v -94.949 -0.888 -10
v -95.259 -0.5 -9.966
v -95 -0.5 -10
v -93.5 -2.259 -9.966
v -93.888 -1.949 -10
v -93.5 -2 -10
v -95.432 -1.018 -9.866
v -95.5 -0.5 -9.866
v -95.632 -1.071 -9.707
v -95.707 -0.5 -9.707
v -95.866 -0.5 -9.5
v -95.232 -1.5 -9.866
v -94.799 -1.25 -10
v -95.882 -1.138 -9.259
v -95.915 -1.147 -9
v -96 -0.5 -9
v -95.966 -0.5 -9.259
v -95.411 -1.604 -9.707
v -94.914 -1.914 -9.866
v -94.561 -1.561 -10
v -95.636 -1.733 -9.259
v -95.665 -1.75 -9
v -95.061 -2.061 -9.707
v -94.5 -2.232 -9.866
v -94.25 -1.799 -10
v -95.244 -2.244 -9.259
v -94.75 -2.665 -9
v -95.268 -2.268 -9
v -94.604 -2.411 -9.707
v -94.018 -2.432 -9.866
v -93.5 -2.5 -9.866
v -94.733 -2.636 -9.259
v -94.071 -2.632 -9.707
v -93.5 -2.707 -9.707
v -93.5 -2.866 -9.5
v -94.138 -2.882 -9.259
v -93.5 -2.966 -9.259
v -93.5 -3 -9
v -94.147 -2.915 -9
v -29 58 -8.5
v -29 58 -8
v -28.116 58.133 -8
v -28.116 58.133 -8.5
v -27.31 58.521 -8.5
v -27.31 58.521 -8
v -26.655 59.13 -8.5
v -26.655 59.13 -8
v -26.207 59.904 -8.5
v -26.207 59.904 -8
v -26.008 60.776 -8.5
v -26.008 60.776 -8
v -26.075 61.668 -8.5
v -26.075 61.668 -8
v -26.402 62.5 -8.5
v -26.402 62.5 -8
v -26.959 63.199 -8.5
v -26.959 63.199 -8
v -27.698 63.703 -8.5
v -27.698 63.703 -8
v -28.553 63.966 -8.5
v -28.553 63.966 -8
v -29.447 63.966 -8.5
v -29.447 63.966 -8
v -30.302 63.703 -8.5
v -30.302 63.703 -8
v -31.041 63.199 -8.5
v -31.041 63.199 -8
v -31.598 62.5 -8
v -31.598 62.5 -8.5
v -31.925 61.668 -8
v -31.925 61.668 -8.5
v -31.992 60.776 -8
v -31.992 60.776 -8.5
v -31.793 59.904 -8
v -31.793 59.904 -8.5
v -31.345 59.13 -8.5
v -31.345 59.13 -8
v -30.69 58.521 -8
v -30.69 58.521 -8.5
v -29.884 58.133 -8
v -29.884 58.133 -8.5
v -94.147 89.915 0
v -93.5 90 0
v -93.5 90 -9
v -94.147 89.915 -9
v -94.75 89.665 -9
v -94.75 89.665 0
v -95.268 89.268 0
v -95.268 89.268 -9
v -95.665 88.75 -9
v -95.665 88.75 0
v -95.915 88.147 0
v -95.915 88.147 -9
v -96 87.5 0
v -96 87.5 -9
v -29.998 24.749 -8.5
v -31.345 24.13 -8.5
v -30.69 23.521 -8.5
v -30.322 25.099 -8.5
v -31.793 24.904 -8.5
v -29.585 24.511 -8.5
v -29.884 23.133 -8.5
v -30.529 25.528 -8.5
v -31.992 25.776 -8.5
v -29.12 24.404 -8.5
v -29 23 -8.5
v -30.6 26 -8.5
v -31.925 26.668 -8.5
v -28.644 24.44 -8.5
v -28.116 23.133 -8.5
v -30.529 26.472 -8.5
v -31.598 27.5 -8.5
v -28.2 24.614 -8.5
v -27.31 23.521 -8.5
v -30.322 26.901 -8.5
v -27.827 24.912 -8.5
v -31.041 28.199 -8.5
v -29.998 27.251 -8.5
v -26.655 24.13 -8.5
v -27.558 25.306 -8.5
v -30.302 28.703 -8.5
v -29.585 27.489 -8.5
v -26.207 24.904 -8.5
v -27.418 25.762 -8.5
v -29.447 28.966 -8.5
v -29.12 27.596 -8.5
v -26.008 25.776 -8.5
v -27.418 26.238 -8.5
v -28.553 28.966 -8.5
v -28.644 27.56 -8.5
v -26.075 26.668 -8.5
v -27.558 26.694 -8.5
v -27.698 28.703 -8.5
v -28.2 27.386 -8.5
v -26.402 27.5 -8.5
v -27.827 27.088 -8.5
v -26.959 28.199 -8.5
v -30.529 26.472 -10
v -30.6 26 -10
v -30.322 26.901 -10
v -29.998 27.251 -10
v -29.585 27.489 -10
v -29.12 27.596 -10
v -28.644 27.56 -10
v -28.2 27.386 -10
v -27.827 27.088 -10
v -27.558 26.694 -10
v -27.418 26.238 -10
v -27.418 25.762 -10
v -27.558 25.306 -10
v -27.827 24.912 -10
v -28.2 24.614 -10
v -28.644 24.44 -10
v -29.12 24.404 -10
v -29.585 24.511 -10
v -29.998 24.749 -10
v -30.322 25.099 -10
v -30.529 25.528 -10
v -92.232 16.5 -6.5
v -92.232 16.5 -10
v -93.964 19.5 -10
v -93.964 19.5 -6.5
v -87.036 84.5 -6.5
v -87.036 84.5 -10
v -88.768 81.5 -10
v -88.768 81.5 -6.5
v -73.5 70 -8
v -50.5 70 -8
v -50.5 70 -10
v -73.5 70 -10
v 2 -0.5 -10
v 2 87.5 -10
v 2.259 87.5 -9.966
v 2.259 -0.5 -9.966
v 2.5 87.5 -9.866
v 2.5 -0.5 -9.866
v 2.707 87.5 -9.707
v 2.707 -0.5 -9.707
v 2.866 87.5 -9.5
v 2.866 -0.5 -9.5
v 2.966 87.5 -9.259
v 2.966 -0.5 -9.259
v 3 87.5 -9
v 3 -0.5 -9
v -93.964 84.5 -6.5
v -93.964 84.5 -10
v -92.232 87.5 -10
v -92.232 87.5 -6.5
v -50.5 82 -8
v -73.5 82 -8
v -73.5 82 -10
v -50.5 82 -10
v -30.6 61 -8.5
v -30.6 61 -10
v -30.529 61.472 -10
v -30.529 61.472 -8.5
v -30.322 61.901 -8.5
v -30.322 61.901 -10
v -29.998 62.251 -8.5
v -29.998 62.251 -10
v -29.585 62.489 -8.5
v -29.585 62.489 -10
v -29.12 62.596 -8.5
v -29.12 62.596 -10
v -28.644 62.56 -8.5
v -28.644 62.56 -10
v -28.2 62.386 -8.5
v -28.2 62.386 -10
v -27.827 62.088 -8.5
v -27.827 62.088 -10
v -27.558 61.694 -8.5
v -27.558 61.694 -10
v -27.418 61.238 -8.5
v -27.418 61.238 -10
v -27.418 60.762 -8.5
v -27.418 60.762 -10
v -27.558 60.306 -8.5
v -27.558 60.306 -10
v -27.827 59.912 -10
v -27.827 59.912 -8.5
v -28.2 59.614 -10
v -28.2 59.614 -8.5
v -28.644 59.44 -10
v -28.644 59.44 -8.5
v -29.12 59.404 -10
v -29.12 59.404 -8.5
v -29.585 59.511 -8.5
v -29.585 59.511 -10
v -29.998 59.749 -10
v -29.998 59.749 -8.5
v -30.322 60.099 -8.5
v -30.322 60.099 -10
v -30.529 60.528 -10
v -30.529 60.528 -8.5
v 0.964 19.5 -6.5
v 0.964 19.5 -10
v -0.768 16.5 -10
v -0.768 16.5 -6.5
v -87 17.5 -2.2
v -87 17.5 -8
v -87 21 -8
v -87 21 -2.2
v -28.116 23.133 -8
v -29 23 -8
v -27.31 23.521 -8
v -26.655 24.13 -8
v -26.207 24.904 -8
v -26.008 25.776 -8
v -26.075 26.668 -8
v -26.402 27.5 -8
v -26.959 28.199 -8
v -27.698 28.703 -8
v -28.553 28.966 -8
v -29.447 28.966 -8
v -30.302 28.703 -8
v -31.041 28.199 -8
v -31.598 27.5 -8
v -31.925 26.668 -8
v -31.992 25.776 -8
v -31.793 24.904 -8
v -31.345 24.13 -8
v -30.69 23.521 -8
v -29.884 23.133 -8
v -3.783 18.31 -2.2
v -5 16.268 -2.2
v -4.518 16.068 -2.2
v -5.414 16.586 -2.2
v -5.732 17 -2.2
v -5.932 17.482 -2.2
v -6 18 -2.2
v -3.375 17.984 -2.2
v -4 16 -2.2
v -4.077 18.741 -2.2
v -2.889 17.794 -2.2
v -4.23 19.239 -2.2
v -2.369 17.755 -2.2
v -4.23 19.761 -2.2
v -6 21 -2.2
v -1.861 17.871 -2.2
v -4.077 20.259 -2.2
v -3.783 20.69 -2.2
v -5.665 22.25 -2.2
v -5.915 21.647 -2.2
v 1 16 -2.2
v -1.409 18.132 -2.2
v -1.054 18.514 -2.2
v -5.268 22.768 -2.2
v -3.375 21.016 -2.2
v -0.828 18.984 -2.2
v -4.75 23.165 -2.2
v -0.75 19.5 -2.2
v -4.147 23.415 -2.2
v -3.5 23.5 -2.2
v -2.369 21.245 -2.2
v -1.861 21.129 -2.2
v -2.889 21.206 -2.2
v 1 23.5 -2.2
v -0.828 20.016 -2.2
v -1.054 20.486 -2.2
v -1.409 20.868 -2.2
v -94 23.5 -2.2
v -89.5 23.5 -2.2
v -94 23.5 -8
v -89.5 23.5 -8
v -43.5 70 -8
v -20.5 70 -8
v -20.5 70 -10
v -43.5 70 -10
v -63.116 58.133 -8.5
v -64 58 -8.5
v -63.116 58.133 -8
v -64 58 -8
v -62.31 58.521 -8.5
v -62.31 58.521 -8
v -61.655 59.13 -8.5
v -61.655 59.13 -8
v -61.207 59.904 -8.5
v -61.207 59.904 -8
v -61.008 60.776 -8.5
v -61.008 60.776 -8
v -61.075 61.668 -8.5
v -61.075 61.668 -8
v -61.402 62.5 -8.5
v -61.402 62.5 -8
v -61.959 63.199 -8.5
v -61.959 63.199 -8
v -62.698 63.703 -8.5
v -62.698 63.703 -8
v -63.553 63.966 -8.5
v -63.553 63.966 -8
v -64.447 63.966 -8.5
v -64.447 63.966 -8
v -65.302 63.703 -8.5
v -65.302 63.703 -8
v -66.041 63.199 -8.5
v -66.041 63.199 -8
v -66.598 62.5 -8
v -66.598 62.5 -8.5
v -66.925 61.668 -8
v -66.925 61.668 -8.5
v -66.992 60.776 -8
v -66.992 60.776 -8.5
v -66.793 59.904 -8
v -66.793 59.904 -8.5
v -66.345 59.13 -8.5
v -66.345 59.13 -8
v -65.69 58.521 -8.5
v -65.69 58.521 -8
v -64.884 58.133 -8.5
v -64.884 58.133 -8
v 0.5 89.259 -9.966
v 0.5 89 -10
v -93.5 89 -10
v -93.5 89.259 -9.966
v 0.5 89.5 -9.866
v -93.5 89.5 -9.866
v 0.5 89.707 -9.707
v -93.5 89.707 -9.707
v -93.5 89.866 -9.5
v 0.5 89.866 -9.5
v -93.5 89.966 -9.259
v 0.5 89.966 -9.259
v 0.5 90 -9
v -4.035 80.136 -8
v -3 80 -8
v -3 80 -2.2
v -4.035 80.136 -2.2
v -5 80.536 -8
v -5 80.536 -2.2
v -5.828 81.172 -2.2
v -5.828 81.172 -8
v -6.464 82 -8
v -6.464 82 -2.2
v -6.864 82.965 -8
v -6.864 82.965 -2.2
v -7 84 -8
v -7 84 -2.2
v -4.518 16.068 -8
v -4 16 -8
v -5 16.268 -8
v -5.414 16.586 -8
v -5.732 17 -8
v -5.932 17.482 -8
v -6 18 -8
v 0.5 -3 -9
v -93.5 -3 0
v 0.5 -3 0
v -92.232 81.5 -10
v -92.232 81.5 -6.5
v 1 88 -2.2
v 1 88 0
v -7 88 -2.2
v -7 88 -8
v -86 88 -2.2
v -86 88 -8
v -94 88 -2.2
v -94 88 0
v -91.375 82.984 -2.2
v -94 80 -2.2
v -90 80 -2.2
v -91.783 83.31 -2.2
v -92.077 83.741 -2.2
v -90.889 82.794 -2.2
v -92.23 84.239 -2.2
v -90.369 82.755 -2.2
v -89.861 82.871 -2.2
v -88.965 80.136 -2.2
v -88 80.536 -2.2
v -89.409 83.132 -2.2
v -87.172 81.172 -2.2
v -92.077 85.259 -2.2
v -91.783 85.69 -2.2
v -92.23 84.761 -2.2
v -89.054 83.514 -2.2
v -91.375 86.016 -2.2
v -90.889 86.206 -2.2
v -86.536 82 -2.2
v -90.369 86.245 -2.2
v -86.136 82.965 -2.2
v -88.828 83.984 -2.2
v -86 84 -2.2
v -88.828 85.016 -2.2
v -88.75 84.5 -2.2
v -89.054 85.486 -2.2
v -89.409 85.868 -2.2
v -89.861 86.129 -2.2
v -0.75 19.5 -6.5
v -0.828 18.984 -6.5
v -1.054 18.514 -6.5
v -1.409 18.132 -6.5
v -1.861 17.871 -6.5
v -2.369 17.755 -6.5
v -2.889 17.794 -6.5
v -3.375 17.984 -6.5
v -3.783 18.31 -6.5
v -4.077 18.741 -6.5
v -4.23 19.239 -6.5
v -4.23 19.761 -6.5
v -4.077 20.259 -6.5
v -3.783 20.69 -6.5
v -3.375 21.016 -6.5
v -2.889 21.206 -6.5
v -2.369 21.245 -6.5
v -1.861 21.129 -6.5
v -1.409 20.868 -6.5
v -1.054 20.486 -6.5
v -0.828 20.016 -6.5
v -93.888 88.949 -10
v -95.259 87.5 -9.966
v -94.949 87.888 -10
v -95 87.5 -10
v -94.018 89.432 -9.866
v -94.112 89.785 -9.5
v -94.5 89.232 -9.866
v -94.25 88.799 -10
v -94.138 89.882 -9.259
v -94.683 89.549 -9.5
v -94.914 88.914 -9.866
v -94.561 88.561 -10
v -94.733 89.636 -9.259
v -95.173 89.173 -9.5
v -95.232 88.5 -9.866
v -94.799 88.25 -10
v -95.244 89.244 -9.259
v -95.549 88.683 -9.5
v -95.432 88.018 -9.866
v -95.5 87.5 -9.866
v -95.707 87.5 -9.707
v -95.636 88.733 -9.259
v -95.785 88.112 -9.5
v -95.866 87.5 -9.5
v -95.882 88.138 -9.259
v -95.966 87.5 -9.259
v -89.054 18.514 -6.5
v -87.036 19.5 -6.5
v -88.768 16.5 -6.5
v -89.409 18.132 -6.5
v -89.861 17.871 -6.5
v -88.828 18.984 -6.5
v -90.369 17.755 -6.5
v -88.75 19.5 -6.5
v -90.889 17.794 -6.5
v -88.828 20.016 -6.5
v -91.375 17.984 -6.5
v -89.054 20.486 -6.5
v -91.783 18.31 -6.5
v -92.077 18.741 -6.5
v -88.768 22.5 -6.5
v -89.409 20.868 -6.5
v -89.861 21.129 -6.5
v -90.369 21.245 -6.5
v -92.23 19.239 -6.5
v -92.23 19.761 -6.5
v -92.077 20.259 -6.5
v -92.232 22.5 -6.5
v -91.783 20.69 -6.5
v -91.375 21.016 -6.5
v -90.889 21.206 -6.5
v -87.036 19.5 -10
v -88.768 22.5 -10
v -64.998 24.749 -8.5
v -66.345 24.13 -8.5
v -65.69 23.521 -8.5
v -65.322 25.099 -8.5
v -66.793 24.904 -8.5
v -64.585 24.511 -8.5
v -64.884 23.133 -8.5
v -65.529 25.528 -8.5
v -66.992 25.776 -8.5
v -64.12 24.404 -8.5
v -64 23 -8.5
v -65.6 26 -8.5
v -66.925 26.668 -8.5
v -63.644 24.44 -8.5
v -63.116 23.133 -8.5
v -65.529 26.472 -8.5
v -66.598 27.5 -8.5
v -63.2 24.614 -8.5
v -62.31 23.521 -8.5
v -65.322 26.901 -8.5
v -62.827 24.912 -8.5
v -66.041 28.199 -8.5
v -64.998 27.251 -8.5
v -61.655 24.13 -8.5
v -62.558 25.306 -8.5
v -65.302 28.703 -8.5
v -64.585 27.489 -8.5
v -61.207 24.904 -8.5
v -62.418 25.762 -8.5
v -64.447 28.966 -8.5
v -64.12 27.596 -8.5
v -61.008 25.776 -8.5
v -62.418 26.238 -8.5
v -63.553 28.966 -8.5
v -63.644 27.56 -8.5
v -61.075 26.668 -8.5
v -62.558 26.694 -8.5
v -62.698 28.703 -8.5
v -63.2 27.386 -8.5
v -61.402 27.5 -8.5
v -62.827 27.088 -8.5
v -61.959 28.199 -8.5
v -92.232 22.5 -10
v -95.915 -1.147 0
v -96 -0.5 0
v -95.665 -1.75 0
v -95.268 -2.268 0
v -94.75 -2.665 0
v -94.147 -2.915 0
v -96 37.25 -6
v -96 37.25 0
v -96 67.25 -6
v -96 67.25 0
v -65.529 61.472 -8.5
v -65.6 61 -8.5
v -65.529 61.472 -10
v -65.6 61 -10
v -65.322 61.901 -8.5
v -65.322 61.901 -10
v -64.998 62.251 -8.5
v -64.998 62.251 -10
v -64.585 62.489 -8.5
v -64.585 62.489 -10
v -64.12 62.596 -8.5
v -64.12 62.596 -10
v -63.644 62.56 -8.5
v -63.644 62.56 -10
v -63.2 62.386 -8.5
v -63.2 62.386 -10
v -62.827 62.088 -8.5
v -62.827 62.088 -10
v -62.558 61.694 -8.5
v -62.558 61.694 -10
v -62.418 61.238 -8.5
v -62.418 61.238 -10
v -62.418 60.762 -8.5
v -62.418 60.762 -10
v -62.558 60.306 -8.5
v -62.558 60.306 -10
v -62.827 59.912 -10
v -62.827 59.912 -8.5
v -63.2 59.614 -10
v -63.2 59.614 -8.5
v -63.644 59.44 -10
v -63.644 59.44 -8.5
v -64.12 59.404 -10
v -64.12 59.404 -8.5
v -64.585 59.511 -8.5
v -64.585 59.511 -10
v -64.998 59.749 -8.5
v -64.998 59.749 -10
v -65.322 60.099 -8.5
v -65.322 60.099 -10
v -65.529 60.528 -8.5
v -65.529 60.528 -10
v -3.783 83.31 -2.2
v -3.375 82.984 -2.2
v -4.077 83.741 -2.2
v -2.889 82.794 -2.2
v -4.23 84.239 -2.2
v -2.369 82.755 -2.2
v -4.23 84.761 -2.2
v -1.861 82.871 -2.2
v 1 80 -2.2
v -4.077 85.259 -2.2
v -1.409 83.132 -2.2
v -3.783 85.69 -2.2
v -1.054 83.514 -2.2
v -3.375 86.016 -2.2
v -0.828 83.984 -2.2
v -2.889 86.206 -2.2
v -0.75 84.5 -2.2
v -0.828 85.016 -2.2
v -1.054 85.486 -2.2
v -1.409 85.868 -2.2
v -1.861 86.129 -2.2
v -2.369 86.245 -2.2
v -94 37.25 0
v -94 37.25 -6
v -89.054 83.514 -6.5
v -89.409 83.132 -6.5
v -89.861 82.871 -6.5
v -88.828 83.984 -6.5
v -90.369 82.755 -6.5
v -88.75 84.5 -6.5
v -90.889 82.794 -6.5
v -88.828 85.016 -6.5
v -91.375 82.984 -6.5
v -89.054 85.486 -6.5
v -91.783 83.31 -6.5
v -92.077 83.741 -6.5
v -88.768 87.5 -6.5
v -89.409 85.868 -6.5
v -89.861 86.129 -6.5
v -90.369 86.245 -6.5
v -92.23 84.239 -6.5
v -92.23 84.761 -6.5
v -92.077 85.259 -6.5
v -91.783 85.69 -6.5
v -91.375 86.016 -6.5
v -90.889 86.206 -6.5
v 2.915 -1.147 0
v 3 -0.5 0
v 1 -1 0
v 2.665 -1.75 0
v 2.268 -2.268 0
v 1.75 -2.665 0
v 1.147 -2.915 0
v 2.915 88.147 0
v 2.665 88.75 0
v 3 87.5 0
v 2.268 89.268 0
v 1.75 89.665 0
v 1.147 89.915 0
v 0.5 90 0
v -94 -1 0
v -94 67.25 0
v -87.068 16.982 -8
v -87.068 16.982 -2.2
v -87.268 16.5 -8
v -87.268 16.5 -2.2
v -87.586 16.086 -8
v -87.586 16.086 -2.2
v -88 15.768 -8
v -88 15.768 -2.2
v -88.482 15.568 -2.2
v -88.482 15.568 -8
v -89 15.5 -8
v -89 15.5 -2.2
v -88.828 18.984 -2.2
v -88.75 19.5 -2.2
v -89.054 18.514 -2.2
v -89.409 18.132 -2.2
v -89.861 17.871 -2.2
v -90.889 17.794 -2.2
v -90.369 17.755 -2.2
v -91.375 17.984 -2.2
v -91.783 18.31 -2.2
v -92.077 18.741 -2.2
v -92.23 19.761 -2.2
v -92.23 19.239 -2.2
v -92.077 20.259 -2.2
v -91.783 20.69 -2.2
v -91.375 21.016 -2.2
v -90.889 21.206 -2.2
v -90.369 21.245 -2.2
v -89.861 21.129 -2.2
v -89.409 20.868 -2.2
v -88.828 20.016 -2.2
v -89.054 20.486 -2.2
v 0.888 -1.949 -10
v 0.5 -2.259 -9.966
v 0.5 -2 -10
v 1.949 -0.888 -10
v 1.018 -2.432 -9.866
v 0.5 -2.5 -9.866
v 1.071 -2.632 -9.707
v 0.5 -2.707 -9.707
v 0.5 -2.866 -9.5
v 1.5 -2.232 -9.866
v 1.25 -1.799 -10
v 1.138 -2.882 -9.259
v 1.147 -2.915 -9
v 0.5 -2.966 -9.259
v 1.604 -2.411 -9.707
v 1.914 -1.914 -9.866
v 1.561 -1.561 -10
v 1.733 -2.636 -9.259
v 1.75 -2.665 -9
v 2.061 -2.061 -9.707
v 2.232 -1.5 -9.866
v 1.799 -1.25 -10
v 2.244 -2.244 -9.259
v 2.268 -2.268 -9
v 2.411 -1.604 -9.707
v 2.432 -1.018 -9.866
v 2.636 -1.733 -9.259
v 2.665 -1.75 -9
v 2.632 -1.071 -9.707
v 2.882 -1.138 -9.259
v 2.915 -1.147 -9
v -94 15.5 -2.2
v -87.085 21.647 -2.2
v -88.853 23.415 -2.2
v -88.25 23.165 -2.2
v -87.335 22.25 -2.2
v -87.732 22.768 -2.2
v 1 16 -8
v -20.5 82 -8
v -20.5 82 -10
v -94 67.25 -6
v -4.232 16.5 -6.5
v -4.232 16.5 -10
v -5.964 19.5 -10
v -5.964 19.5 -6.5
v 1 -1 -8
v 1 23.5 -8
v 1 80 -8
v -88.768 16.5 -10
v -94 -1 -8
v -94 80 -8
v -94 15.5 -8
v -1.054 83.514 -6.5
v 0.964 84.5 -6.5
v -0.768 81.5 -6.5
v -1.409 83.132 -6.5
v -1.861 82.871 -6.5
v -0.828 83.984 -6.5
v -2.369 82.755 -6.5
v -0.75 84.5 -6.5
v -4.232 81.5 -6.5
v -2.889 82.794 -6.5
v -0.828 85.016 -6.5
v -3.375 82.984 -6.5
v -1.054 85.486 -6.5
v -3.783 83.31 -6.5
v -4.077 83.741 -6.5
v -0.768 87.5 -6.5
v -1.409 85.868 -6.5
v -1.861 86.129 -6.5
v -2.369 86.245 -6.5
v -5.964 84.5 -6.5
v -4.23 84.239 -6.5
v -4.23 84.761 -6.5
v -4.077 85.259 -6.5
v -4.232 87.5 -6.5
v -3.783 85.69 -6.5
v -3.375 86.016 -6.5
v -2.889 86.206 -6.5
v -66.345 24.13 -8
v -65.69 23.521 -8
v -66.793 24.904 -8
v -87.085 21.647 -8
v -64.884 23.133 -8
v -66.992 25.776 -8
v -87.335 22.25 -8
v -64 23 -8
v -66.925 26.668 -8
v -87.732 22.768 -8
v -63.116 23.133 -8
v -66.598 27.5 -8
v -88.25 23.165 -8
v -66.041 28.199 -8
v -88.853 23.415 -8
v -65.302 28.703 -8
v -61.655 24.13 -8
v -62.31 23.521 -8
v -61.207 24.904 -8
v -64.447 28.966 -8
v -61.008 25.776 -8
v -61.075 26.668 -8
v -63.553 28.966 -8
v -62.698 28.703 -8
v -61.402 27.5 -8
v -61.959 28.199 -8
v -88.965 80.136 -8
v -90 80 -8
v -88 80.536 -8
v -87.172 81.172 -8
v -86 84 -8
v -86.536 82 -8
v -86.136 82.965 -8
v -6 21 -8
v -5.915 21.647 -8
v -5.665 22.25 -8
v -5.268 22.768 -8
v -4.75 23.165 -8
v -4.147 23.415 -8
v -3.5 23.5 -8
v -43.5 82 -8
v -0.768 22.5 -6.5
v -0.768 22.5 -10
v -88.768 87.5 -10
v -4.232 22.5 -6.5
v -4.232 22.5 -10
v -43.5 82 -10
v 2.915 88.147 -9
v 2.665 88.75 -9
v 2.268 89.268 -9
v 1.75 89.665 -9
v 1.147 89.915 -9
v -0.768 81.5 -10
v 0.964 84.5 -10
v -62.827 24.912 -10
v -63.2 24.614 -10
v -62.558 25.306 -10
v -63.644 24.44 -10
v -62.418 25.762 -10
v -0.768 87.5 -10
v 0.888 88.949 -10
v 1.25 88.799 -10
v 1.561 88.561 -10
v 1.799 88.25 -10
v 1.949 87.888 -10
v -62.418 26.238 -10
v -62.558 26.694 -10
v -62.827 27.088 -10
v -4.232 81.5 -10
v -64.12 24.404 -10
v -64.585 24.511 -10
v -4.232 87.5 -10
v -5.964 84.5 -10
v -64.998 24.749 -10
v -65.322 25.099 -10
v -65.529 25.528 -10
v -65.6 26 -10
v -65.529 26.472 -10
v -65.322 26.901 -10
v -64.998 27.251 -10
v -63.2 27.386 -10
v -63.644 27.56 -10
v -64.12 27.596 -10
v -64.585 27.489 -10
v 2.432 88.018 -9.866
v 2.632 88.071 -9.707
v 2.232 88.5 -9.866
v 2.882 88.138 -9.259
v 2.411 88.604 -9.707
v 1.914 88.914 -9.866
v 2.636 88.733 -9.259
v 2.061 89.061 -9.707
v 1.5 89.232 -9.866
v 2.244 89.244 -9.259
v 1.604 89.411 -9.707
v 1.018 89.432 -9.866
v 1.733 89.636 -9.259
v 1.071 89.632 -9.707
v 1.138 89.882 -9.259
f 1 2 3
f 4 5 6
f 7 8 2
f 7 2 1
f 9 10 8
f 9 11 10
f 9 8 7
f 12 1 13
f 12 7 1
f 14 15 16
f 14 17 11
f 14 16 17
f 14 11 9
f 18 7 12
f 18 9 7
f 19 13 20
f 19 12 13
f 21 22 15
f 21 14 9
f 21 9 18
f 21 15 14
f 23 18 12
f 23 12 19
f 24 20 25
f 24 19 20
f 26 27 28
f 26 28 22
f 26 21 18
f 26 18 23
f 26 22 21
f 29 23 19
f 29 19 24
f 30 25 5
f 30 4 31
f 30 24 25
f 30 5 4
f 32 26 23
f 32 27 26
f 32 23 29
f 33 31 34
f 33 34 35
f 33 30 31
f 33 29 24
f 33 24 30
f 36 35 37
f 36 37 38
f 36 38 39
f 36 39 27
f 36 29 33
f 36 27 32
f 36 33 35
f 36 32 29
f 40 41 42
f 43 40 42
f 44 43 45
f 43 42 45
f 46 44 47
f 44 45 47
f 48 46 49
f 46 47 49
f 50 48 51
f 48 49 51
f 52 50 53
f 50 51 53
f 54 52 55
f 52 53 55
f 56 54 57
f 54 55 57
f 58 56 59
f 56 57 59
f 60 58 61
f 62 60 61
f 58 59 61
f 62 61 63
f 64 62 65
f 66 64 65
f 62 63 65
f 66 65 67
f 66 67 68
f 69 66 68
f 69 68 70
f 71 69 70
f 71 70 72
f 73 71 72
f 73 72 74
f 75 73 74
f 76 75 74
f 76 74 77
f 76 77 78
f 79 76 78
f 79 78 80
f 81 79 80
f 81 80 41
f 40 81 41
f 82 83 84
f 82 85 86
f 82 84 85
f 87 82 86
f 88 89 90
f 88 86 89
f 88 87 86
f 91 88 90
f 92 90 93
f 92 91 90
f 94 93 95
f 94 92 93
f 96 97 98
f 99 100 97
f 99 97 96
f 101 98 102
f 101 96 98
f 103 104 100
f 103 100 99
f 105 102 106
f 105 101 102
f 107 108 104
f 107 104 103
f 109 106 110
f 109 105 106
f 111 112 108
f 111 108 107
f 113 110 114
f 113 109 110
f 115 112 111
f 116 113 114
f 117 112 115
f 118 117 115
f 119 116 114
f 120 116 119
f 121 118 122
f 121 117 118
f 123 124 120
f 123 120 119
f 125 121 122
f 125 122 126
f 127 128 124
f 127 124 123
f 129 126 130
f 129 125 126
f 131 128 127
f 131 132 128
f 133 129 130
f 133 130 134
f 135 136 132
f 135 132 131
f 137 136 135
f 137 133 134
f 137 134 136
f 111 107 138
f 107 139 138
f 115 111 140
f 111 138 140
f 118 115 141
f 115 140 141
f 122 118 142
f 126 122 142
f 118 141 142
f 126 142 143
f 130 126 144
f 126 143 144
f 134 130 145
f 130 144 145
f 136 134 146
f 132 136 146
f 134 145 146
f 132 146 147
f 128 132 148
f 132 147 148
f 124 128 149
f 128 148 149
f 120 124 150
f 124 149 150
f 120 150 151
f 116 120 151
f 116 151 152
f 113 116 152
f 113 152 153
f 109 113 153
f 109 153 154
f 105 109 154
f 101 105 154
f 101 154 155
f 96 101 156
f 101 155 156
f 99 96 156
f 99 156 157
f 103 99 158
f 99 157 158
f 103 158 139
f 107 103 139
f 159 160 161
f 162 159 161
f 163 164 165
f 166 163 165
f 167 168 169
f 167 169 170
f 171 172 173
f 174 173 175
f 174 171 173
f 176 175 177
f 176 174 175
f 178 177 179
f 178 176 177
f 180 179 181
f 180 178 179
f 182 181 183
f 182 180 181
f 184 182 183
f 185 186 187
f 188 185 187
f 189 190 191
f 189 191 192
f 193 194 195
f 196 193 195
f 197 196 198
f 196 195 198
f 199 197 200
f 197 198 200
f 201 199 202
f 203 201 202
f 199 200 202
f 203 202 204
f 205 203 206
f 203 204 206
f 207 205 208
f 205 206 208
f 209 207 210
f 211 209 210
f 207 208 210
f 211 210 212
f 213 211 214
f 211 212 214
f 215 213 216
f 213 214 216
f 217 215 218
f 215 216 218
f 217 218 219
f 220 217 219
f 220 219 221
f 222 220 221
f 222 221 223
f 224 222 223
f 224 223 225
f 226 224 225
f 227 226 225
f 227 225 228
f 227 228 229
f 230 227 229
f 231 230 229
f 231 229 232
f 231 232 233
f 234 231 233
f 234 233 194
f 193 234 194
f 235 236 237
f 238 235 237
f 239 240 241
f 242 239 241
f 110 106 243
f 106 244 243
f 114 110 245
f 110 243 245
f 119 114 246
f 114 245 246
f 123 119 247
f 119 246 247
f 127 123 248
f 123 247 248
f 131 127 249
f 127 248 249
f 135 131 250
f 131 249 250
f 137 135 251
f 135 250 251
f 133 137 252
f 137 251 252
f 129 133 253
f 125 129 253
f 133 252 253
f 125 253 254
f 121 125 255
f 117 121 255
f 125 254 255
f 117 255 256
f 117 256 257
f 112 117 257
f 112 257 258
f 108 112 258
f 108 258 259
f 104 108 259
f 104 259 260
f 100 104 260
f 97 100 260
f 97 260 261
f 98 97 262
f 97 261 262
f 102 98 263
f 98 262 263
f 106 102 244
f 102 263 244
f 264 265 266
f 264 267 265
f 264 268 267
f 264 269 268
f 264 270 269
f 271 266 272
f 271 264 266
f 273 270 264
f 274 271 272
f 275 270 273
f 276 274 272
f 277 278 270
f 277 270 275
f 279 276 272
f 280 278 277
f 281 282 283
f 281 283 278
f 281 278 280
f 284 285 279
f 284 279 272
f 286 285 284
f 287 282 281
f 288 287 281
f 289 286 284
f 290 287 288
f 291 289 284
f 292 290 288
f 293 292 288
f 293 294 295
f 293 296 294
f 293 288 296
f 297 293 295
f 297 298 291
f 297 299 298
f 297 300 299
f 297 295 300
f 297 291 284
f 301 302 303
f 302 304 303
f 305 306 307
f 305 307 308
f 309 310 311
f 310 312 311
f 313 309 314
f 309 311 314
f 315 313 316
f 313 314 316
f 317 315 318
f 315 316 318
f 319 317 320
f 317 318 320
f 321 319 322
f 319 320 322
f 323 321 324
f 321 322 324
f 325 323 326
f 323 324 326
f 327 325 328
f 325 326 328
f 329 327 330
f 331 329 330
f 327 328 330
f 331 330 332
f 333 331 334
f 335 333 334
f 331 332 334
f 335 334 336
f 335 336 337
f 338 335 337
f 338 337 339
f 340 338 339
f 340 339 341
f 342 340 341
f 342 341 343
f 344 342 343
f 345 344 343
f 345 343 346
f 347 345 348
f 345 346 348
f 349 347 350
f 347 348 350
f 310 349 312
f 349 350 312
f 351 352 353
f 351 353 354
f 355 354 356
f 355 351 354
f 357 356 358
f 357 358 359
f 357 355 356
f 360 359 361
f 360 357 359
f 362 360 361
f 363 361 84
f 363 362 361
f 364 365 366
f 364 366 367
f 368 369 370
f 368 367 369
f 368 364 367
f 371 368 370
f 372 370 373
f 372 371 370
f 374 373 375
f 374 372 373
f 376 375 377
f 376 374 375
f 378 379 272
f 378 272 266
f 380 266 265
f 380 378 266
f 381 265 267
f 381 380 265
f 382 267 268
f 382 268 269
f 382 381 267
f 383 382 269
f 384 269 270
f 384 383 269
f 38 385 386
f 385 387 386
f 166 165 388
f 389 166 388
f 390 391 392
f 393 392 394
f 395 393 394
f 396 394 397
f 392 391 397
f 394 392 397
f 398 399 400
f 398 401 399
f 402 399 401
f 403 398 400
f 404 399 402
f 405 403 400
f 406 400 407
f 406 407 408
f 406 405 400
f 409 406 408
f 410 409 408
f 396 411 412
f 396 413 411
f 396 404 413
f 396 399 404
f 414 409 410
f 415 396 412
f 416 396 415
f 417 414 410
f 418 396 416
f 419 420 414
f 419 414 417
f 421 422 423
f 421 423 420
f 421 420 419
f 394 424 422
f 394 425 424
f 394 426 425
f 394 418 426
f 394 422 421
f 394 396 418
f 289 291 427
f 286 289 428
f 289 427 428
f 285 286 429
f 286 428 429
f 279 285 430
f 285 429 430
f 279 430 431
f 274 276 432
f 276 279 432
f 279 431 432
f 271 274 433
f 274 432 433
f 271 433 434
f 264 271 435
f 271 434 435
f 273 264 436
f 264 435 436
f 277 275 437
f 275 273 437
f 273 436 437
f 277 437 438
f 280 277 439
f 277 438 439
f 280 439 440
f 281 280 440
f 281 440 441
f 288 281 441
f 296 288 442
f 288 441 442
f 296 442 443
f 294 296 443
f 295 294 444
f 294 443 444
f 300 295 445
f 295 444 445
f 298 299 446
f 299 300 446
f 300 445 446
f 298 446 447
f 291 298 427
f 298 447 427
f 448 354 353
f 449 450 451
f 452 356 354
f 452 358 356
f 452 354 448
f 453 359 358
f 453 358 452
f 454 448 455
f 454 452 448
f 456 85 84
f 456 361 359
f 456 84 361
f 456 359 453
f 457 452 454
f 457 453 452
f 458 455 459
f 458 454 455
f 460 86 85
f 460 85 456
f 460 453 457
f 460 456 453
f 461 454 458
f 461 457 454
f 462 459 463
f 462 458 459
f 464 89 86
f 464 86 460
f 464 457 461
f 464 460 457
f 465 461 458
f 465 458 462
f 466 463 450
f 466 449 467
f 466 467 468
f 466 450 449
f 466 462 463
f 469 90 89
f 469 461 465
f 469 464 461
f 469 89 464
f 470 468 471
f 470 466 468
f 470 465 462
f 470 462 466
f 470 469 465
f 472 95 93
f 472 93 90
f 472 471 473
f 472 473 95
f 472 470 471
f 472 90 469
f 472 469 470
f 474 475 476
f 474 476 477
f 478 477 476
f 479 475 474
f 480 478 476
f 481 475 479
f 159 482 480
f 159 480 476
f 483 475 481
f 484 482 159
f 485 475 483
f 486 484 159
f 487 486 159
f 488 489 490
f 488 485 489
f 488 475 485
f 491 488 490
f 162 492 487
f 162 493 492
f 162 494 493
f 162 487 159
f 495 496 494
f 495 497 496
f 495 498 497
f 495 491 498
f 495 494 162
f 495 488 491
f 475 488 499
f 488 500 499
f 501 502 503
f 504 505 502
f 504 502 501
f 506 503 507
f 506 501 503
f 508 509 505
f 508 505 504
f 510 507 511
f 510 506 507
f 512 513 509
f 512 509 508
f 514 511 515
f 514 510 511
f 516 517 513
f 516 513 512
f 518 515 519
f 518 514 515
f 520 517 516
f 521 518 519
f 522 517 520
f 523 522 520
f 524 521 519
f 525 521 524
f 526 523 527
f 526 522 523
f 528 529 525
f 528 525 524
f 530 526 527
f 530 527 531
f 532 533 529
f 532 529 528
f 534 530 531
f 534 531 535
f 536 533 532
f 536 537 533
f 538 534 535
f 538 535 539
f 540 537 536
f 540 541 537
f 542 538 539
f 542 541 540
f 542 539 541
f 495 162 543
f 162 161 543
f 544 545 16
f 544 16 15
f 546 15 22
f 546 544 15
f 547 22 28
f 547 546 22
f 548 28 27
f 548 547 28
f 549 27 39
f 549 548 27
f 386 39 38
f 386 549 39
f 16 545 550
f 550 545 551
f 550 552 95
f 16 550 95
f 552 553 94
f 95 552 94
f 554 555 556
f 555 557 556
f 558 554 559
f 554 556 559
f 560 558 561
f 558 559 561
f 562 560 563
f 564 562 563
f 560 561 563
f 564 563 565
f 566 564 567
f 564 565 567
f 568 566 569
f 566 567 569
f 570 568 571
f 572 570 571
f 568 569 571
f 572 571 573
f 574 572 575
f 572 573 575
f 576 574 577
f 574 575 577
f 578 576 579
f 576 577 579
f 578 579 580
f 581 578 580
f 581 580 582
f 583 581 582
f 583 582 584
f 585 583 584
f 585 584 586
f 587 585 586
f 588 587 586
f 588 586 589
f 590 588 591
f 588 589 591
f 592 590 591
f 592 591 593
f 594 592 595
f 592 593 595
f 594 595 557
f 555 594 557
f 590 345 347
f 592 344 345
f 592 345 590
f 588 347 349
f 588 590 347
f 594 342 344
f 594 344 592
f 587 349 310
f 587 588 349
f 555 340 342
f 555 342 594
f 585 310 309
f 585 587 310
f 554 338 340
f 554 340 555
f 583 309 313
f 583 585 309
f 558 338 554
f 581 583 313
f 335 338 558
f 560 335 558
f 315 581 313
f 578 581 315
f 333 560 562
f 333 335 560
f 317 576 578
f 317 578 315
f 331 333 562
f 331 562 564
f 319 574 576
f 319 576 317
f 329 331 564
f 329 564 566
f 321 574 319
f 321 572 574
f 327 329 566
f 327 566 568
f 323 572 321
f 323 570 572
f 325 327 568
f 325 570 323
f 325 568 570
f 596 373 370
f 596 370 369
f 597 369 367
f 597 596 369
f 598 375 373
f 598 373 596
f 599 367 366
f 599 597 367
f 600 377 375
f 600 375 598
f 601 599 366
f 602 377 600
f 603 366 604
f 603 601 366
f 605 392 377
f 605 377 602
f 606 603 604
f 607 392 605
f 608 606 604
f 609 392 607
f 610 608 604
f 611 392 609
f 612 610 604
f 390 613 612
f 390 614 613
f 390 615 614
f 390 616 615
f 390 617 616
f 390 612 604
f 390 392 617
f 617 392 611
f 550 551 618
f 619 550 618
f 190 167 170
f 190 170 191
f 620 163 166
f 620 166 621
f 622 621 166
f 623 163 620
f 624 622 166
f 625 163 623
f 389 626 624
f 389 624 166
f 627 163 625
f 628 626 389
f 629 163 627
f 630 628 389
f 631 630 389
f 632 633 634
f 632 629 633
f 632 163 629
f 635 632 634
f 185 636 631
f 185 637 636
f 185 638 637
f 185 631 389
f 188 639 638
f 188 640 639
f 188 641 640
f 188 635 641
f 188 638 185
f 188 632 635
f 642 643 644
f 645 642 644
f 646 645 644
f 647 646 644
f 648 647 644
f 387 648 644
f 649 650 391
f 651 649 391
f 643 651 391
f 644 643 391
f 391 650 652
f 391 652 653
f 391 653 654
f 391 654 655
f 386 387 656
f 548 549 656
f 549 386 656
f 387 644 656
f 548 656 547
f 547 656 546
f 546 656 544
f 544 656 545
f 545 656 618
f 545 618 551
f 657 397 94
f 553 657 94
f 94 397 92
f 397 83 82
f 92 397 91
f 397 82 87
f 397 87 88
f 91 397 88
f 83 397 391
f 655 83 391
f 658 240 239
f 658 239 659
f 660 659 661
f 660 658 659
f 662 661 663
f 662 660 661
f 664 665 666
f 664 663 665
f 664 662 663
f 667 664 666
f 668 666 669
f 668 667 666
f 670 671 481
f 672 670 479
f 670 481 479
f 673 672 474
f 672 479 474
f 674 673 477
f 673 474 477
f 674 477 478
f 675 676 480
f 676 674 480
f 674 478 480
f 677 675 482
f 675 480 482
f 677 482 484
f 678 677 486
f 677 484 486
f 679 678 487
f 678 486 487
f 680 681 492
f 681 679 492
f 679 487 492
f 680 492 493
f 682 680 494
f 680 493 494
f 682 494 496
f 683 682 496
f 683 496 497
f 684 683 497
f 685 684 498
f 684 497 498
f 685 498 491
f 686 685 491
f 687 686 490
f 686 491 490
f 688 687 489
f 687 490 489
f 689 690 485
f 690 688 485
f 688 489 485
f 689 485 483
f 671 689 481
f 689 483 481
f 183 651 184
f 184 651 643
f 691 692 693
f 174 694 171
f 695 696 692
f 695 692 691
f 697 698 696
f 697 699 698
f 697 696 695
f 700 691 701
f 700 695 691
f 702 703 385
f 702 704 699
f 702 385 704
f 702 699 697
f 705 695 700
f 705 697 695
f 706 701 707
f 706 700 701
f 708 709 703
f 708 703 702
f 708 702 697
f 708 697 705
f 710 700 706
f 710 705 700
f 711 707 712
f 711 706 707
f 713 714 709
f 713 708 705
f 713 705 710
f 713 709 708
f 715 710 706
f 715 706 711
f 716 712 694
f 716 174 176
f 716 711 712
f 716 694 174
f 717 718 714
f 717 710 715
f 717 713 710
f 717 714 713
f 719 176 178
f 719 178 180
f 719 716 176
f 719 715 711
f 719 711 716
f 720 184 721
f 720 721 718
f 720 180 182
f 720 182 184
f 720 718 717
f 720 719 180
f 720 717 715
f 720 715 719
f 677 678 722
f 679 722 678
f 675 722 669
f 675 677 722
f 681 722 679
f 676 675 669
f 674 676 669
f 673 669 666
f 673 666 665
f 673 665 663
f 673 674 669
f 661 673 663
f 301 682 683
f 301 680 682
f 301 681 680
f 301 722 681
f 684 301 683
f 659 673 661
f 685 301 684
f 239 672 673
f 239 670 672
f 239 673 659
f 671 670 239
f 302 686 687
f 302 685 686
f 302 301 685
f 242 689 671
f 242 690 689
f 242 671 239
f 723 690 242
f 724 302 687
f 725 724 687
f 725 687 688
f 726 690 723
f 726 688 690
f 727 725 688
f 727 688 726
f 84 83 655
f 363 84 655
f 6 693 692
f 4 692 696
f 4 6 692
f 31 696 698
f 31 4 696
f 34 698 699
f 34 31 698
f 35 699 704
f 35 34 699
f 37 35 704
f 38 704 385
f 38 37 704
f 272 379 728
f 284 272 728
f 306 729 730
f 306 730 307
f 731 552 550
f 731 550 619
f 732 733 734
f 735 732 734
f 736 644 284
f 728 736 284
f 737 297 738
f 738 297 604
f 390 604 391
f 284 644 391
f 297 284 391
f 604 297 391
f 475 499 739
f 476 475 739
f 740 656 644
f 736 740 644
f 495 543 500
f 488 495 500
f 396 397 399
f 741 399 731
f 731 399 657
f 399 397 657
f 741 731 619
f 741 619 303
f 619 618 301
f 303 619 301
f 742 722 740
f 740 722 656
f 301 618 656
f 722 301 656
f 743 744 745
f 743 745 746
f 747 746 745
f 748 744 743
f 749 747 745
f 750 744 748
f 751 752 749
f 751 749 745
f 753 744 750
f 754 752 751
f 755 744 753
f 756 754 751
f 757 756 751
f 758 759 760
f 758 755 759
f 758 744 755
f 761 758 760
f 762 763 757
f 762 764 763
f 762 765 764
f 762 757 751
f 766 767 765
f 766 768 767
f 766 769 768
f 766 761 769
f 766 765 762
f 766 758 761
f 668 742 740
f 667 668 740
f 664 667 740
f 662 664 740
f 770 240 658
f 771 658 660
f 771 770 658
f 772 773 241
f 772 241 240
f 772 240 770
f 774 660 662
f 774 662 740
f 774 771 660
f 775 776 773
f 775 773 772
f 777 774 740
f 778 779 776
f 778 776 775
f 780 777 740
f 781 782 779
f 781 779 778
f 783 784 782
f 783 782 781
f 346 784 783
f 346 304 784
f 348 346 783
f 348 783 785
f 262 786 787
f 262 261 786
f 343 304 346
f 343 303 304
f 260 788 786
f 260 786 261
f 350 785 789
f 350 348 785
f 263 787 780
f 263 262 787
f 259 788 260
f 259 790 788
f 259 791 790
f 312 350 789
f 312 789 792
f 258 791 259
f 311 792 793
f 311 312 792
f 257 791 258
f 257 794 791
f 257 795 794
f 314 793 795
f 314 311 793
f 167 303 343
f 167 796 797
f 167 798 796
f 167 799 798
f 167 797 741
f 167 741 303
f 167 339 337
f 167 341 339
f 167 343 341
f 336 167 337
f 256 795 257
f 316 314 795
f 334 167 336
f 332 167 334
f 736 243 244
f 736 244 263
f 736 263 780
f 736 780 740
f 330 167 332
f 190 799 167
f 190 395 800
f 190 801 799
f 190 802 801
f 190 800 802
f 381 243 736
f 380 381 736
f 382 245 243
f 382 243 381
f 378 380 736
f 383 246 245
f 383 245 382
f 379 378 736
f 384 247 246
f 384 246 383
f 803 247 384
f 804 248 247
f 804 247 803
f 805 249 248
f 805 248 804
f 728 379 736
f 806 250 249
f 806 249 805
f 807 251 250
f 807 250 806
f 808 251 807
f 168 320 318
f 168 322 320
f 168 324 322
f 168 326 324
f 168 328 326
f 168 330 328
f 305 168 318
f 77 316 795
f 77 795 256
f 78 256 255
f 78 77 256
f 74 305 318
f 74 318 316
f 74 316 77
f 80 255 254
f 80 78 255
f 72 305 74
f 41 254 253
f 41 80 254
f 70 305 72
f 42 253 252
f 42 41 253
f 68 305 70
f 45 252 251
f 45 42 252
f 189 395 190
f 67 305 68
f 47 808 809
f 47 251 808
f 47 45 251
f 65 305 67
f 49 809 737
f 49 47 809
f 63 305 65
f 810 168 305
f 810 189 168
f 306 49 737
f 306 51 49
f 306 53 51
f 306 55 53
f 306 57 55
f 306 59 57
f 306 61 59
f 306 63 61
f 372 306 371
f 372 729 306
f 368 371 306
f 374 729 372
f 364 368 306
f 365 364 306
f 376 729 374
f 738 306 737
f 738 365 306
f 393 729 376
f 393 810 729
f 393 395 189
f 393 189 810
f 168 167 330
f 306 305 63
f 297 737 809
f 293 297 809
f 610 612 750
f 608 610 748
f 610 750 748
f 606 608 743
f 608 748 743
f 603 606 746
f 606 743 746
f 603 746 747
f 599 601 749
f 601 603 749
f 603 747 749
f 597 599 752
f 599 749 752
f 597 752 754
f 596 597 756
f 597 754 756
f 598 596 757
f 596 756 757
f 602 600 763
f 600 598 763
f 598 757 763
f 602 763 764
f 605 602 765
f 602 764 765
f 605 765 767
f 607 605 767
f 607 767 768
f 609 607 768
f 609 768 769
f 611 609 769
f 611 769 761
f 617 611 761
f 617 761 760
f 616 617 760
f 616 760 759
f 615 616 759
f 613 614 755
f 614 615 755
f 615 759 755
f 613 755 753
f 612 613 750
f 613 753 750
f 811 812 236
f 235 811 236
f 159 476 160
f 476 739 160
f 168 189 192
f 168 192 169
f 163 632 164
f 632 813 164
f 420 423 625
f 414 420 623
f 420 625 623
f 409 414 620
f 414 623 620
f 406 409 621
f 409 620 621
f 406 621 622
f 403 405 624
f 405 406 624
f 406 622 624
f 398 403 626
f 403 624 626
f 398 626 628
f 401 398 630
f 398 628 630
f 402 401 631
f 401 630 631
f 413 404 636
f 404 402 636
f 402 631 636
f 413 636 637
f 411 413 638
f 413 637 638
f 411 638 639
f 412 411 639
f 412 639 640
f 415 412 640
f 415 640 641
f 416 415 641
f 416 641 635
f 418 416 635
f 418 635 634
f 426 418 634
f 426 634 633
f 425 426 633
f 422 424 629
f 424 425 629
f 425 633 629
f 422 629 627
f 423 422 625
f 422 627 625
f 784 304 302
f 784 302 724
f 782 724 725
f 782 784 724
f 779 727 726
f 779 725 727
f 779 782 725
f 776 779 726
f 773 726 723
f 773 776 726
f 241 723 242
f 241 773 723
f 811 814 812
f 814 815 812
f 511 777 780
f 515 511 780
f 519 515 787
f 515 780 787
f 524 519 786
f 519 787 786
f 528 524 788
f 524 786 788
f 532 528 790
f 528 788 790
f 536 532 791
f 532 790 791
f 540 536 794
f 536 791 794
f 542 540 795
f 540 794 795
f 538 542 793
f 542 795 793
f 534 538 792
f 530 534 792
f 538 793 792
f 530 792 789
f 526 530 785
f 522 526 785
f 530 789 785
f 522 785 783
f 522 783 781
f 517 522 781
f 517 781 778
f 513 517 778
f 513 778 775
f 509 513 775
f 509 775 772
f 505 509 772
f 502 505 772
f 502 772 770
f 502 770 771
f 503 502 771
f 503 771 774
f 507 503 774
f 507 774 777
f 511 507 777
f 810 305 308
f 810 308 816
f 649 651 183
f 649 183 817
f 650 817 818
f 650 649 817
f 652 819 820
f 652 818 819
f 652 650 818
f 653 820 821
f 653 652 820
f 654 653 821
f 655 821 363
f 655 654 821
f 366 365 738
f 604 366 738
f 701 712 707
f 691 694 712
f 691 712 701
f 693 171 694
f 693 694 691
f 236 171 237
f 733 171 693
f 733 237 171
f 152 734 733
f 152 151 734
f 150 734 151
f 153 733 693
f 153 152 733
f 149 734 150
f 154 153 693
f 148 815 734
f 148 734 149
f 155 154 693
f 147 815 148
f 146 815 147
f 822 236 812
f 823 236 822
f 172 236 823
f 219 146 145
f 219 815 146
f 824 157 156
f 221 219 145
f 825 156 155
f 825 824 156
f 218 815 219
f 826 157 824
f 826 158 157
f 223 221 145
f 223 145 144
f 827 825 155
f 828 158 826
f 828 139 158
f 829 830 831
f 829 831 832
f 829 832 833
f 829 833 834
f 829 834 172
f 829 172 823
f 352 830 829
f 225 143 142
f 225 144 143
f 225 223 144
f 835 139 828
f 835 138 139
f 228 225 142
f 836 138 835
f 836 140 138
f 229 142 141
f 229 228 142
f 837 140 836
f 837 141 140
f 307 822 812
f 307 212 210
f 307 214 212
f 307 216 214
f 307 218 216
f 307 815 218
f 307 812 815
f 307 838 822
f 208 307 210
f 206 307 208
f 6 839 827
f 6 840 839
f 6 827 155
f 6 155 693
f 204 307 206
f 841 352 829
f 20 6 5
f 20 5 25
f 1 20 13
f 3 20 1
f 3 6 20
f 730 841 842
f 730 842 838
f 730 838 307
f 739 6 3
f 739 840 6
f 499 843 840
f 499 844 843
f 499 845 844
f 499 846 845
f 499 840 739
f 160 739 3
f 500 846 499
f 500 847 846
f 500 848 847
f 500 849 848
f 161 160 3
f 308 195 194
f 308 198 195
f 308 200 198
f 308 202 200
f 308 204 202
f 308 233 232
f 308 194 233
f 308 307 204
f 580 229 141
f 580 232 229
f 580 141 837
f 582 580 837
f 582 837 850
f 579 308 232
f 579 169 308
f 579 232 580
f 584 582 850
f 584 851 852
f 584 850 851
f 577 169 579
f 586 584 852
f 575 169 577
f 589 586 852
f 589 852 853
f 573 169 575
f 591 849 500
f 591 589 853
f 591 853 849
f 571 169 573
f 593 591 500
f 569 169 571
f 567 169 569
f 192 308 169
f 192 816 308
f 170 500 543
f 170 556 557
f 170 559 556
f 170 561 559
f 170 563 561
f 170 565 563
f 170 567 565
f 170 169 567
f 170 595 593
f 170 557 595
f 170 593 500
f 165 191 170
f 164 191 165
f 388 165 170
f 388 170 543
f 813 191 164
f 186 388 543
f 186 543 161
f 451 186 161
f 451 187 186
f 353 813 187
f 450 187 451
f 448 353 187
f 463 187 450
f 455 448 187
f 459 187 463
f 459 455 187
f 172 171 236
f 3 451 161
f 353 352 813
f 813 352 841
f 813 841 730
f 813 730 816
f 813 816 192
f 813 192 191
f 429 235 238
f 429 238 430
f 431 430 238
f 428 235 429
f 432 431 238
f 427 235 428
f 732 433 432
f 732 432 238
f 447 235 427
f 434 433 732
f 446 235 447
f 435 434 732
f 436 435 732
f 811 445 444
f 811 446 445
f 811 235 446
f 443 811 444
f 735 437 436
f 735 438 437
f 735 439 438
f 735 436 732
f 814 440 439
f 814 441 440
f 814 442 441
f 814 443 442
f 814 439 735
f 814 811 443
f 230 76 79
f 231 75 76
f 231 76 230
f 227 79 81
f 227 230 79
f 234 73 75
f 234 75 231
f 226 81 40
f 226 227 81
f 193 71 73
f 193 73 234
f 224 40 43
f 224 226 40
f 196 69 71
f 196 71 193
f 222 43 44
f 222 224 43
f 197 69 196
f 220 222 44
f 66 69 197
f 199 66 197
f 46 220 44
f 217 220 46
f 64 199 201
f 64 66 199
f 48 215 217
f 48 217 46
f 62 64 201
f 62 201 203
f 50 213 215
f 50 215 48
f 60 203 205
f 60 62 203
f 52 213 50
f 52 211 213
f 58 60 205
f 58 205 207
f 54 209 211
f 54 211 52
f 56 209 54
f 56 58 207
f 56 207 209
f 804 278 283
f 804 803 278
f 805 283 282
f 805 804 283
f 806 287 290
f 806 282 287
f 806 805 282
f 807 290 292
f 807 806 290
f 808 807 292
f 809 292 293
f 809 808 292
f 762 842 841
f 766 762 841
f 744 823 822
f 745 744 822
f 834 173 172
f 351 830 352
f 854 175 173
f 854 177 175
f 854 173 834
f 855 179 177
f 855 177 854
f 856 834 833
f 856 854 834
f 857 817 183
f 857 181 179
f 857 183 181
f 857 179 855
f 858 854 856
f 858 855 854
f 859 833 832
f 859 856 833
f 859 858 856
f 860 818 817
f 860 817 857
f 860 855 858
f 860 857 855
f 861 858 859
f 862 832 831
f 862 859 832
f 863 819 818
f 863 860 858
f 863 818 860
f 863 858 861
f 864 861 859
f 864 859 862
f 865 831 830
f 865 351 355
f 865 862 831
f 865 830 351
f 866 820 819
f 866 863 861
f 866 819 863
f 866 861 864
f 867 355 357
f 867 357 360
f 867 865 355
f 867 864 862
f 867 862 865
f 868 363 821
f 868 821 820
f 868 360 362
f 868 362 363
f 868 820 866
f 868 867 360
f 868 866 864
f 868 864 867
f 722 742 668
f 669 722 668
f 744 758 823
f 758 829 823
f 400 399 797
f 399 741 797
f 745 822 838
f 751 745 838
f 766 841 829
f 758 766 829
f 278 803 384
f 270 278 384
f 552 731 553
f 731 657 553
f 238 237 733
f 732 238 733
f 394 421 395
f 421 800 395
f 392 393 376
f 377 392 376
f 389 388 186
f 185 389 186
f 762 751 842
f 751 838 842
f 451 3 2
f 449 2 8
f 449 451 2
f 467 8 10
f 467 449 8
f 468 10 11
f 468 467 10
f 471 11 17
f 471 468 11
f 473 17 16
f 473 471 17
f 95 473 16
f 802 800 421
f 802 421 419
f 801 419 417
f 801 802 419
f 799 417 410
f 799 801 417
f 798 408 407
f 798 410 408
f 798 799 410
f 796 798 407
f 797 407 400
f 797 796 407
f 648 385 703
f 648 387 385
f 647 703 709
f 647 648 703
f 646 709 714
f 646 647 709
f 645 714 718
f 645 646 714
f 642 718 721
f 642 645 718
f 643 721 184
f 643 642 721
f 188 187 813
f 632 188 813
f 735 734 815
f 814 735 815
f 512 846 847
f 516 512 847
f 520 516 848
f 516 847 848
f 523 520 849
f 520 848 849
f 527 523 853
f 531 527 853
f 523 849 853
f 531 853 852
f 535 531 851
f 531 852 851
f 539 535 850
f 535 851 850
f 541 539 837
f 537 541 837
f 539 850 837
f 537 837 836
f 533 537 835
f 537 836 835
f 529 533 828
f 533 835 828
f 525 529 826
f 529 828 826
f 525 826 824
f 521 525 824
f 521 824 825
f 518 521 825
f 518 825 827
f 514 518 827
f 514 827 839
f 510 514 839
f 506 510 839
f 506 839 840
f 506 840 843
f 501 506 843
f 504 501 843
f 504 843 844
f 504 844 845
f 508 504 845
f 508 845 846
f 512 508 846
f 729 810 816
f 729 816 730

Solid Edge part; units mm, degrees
sketch "Sketch1" plane through (0, 0, 0) normal (0, 0, -1) x (-1, 0, 0)
  line L0 (20.5, 70) -> (43.5, 70)
  line L1 (43.5, 70) -> (43.5, 82)
  line L2 (43.5, 82) -> (20.5, 82)
  line L3 (20.5, 82) -> (20.5, 70)
  line L4 (50.5, 70) -> (73.5, 70)
  line L5 (73.5, 70) -> (73.5, 82)
  line L6 (73.5, 82) -> (50.5, 82)
  line L7 (50.5, 82) -> (50.5, 70)
  circle A0 centre (2.5, 84.5) radius 1.75
  circle A1 centre (90.5, 84.5) radius 1.75
  circle A2 centre (2.5, 19.5) radius 1.75
  circle A3 centre (90.5, 19.5) radius 1.75
  line L8 (96, -0.5) -> (96, 87.5)
  arc A4 (96, 87.5) -> (93.5, 90) centre (93.5, 87.5) ccw
  line L9 (93.5, 90) -> (-0.5, 90)
  arc A5 (-0.5, 90) -> (-3, 87.5) centre (-0.5, 87.5) ccw
  line L10 (-3, 87.5) -> (-3, -0.5)
  arc A6 (-3, -0.5) -> (-0.5, -3) centre (-0.5, -0.5) ccw
  line L11 (-0.5, -3) -> (93.5, -3)
  arc A7 (96, -0.5) -> (93.5, -3) centre (93.5, -0.5) cw
extrude "Protrusion1" add sketch "Sketch1" along normal blind 10
sketch "Sketch2" plane through (-46.5, 43.5, 0) normal (0, 0, 1) x (1, 0, 0)
  line L0 (-49.5, -6.25) -> (-18.5, -6.25)
  line L1 (-18.5, -6.25) -> (-18.5, 23.75)
  line L2 (-18.5, 23.75) -> (-49.5, 23.75)
  line L3 (-49.5, 23.75) -> (-49.5, -6.25)
extrude "ExtrudedCutout_1" cut sketch "Sketch2" against normal blind 6
sketch "Sketch3" plane through (-46.5, 43.5, 0) normal (0, 0, 1) x (1, 0, 0)
  line L0 (-47.5, -44.5) -> (47.5, -44.5)
  line L1 (47.5, -44.5) -> (47.5, 44.5)
  line L2 (47.5, 44.5) -> (-47.5, 44.5)
  line L3 (-47.5, 44.5) -> (-47.5, -44.5)
extrude "ExtrudedCutout_3" cut sketch "Sketch3" against normal blind 8
sketch "Sketch4" plane through (-46.5, 43.5, -8) normal (0, 0, 1) x (1, 0, 0)
  line L0 (39.5, 44.5) -> (39.5, 40.5)
  arc A0 (39.5, 40.5) -> (43.5, 36.5) centre (43.5, 40.5) ccw
  line L1 (43.5, 36.5) -> (47.5, 36.5)
  line L2 (47.5, 36.5) -> (47.5, 44.5)
  line L3 (47.5, 44.5) -> (39.5, 44.5)
  line L4 (-47.5, -28) -> (-42.5, -28)
  arc A1 (-42.5, -28) -> (-40.5, -26) centre (-42.5, -26) ccw
  line L5 (-40.5, -26) -> (-40.5, -22.5)
  arc A2 (-40.5, -22.5) -> (-43, -20) centre (-43, -22.5) ccw
  line L6 (-43, -20) -> (-47.5, -20)
  line L7 (-47.5, -20) -> (-47.5, -28)
  line L8 (42.5, -27.5) -> (47.5, -27.5)
  line L9 (47.5, -27.5) -> (47.5, -20)
  line L10 (47.5, -20) -> (43, -20)
  arc A3 (43, -20) -> (40.5, -22.5) centre (43, -22.5) ccw
  line L11 (40.5, -22.5) -> (40.5, -25.5)
  arc A4 (42.5, -27.5) -> (40.5, -25.5) centre (42.5, -25.5) cw
  circle A5 centre (-44, 41) radius 1.75
  circle A6 centre (44, 41) radius 1.75
  circle A7 centre (44, -24) radius 1.75
  circle A8 centre (-44, -24) radius 1.75
  line L12 (-47.5, 36.5) -> (-43.5, 36.5)
  arc A9 (-43.5, 36.5) -> (-39.5, 40.5) centre (-43.5, 40.5) ccw
  line L13 (-39.5, 40.5) -> (-39.5, 44.5)
  line L14 (-39.5, 44.5) -> (-47.5, 44.5)
  line L15 (-47.5, 44.5) -> (-47.5, 36.5)
  dimension "D1" = 4
  dimension "D2" = 22.5
  dimension "D3" = 3.5
  dimension "D4" = 22.5
  dimension "D5" = 4
extrude "ExtrudedProtrusion_2" add sketch "Sketch4" along normal blind 5.8
sketch "Sketch5" plane through (-46.5, 43.5, -10) normal (0, 0, -1) x (-1, 0, 0)
  line L0 (-45.7321, 44) -> (-47.4641, 41)
  line L1 (-47.4641, 41) -> (-45.7321, 38)
  line L2 (-45.7321, 38) -> (-42.2679, 38)
  line L3 (-42.2679, 38) -> (-40.5359, 41)
  line L4 (-40.5359, 41) -> (-42.2679, 44)
  line L5 (-42.2679, 44) -> (-45.7321, 44)
  line L6 (42.2679, 44) -> (40.5359, 41)
  line L7 (40.5359, 41) -> (42.2679, 38)
  line L8 (42.2679, 38) -> (45.7321, 38)
  line L9 (45.7321, 38) -> (47.4641, 41)
  line L10 (47.4641, 41) -> (45.7321, 44)
  line L11 (45.7321, 44) -> (42.2679, 44)
  line L12 (-45.7321, -21) -> (-47.4641, -24)
  line L13 (-47.4641, -24) -> (-45.7321, -27)
  line L14 (-45.7321, -27) -> (-42.2679, -27)
  line L15 (-42.2679, -27) -> (-40.5359, -24)
  line L16 (-40.5359, -24) -> (-42.2679, -21)
  line L17 (-42.2679, -21) -> (-45.7321, -21)
  line L18 (42.2679, -21) -> (40.5359, -24)
  line L19 (40.5359, -24) -> (42.2679, -27)
  line L20 (42.2679, -27) -> (45.7321, -27)
  line L21 (45.7321, -27) -> (47.4641, -24)
  line L22 (47.4641, -24) -> (45.7321, -21)
  line L23 (45.7321, -21) -> (42.2679, -21)
extrude "ExtrudedCutout_4" cut sketch "Sketch5" against normal blind 3.5
sketch "Sketch6" plane through (-46.5, 43.5, -10) normal (0, 0, -1) x (-1, 0, 0)
  circle A0 centre (17.5, 17.5) radius 1.6
  circle A1 centre (-17.5, -17.5) radius 1.6
  circle A2 centre (17.5, -17.5) radius 1.6
  circle A3 centre (-17.5, 17.5) radius 1.6
extrude "ExtrudedCutout_5" cut sketch "Sketch6" against normal blind 2
sketch "Sketch7" plane through (-46.5, 43.5, -8) normal (0, 0, 1) x (0, -1, 0)
  circle A0 centre (-17.5, -17.5) radius 3
  circle A1 centre (-17.5, 17.5) radius 3
  circle A2 centre (17.5, 17.5) radius 3
  circle A3 centre (17.5, -17.5) radius 3
extrude "ExtrudedCutout_6" cut sketch "Sketch7" against normal blind 0.5
fillet "Round_1" radius 1 8 edges at (-46.5, 90, -10) (2.2678, 89.2678, -10) (3, 43.5, -10) (2.2678, -2.2678, -10) (-46.5, -3, -10) (-95.2678, -2.2678, -10) (-96, 43.5, -10) (-95.2678, 89.2678, -10)
